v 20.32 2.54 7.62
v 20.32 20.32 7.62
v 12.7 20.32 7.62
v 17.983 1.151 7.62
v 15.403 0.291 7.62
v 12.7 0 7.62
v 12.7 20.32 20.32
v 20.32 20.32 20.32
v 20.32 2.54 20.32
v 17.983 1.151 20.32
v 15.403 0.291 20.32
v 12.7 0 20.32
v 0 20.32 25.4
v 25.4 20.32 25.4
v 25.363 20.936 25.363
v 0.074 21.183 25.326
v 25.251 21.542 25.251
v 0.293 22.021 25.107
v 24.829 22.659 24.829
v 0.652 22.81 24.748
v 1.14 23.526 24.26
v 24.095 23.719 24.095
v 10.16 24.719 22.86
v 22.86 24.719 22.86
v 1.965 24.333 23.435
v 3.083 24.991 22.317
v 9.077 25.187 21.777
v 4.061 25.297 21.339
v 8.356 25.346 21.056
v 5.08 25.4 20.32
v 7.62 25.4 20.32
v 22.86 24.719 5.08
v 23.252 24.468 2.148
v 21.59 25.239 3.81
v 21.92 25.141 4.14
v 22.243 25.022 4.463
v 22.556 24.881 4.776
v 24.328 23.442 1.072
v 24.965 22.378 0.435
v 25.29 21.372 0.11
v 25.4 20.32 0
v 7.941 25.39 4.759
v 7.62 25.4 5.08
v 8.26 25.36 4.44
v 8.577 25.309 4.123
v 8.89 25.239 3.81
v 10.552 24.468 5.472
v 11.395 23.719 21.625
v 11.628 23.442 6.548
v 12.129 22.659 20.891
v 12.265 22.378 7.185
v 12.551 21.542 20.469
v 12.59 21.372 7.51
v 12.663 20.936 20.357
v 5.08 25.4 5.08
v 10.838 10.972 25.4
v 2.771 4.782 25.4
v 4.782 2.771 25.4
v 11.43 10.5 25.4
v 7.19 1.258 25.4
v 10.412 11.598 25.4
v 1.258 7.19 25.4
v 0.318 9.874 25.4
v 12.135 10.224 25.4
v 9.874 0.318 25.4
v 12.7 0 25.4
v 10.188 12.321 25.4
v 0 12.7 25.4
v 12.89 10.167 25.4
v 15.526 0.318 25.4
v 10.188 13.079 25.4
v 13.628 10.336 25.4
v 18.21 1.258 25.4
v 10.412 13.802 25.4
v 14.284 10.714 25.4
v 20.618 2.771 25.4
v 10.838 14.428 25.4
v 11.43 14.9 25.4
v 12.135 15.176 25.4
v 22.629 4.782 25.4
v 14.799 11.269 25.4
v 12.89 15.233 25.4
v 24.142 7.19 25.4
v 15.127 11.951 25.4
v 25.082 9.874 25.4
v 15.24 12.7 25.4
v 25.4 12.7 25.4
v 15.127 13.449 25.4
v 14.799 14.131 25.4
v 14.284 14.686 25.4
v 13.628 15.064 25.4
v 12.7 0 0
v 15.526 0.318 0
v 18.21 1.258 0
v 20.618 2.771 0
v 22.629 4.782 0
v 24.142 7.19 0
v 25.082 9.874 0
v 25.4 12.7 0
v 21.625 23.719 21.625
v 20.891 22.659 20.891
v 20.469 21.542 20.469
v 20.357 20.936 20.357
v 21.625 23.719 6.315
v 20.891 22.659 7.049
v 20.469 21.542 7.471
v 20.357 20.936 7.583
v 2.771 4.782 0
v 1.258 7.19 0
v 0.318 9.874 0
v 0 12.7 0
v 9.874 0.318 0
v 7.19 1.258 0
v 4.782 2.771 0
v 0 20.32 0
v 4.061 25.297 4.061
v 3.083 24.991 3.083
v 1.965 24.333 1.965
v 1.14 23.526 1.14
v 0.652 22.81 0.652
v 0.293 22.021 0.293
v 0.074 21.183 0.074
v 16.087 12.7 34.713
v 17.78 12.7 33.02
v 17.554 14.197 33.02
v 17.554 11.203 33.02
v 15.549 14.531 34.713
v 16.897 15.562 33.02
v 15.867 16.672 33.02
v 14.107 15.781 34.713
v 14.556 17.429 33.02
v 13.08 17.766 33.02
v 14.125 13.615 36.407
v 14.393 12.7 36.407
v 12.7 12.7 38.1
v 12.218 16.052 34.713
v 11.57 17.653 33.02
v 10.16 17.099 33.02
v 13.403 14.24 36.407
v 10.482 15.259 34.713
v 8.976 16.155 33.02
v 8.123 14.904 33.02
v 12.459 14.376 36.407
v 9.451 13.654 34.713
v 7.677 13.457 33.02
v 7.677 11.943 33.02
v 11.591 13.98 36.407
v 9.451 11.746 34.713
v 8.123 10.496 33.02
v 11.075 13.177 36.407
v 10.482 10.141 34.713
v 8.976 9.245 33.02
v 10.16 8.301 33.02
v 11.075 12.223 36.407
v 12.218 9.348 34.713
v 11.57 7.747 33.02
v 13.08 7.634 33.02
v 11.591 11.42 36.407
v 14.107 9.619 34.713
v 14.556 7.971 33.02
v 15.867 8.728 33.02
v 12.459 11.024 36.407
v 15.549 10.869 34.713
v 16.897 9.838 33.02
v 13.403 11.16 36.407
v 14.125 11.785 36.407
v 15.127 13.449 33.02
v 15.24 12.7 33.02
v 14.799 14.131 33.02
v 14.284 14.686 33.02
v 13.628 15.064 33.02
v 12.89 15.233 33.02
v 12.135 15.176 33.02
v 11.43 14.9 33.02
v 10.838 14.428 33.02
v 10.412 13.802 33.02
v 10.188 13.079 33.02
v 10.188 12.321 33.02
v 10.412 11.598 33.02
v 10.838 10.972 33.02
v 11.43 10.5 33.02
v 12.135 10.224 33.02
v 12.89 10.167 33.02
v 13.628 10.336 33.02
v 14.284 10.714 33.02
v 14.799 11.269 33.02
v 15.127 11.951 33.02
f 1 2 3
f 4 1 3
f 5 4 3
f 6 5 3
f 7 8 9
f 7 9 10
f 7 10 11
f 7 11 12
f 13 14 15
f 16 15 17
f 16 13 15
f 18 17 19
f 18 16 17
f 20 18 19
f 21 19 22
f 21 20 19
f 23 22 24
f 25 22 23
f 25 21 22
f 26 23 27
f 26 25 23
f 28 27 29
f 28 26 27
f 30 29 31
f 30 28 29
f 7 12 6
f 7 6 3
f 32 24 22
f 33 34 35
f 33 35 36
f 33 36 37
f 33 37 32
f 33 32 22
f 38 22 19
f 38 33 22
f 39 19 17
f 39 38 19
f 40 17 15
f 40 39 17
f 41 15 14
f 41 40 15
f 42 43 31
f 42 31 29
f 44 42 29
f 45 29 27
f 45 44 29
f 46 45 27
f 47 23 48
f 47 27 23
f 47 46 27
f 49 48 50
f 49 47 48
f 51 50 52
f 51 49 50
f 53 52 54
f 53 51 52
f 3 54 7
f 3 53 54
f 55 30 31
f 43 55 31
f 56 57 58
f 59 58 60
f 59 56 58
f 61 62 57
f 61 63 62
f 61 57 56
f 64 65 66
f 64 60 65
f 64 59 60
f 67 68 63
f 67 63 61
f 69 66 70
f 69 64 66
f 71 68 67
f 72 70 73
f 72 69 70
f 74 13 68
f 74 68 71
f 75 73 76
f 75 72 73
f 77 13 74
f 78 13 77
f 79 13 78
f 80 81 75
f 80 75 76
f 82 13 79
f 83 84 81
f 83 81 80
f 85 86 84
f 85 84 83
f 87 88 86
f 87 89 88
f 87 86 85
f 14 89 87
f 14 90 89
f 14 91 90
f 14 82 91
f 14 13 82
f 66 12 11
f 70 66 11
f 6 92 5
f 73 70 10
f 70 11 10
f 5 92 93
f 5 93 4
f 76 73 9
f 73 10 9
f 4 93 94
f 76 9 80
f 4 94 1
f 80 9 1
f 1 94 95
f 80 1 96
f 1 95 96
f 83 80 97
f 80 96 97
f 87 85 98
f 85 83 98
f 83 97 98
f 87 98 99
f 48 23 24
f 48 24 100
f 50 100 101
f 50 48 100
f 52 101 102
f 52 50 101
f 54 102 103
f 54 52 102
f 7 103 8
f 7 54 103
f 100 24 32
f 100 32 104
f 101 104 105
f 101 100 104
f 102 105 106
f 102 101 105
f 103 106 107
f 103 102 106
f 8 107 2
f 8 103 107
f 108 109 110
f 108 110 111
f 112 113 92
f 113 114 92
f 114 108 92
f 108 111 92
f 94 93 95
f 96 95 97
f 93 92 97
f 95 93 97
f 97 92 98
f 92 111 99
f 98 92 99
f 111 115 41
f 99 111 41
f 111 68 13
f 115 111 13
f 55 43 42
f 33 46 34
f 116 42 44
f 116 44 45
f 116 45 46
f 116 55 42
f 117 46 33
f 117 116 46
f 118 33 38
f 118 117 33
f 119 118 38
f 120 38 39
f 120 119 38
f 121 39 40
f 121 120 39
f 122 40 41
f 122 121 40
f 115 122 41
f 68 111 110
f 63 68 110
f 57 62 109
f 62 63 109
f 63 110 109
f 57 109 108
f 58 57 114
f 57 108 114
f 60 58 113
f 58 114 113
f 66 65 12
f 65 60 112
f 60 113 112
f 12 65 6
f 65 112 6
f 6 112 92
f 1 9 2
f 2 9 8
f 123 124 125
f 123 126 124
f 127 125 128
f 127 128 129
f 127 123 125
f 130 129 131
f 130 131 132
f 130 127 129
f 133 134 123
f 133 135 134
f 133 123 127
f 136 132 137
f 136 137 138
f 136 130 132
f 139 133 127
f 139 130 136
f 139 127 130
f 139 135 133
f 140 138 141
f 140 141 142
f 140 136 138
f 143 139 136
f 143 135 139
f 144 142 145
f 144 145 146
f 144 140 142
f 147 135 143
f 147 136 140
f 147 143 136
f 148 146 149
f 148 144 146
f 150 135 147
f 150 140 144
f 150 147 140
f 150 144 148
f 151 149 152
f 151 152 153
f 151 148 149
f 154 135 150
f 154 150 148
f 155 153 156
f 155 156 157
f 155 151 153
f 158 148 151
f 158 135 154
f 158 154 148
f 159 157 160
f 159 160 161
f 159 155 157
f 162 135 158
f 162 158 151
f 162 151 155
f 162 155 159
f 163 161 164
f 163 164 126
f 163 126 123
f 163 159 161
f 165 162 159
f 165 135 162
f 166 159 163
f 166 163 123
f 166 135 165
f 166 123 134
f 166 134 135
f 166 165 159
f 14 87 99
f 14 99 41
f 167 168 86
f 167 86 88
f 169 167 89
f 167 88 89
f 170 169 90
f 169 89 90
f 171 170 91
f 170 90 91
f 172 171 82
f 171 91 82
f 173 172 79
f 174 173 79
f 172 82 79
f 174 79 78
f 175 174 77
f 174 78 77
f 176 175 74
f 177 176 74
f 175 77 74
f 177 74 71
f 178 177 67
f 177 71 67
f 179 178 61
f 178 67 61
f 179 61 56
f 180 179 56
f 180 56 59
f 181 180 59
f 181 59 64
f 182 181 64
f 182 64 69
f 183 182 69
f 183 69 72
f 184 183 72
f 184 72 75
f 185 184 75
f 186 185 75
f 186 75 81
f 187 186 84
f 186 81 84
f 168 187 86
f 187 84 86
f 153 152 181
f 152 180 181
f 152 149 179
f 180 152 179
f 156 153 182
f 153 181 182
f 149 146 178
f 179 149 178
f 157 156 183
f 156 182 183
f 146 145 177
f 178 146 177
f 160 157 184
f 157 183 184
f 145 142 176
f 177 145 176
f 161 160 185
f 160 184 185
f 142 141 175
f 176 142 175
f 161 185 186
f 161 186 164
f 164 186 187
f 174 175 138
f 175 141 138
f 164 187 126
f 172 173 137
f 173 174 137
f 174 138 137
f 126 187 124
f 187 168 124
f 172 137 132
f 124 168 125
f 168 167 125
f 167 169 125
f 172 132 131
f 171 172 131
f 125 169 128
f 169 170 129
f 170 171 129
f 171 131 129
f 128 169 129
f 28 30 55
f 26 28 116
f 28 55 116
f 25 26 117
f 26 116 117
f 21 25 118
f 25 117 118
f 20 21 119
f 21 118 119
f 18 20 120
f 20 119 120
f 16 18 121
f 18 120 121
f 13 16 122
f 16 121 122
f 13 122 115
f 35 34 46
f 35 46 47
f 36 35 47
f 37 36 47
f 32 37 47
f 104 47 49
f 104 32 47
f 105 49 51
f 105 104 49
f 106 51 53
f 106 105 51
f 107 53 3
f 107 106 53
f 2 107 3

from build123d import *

# Parameters (mm, degrees)
F0_W          = 25.4
F0_H          = 25.4
F1_DEPTH      = 25.4
F2_T1_DEPTH   = 88.9
F3_R          = 2.54
F4_DEPTH      = 7.62
F5_R          = 5.08
F6_DEPTH      = 5.08
F7_SIZE       = 5.07999
F8_W          = 7.62
F8_H          = 12.7
F9_DEPTH      = 25.4
F10_T1_DEPTH  = 50.8
F10_T3_DEPTH  = 50.8
F10_T5_DEPTH  = 7.62
F10_T7_DEPTH  = 12.7
F10_T13_DEPTH = 20.32
F10_T18_DEPTH = 25.4
F10_T26_DEPTH = 20.32
F10_T30_DEPTH = 25.4
F10_T38_DEPTH = 25.4
F10_T43_DEPTH = 20.32
F10_T51_DEPTH = 20.32
F10_T55_DEPTH = 25.4


# Not quite as in the source:
# - a fillet or chamfer that OpenCascade refuses, or shapes differently, is made with other operations: its cross-section is extruded or revolved along the edge and cut away or added
# - a fillet or chamfer is up to 0.001 mm smaller than in the source, because OpenCascade refuses the exact size


with BuildPart() as f1:
    # F0 (on Top) → F1 (new body)
    with BuildSketch(Plane.XY):
        with Locations((12.7, 12.7)):
            Rectangle(F0_W, F0_H)
    extrude(amount=F1_DEPTH)

    # F2: fillet of radius 12.7 on 2 edges, made by hand

    # F2_s2 → F2_t1 (cut)
    with BuildSketch(Plane.XY.offset(-31.75)):
        with BuildLine():
            ThreePointArc((0, 12.7), (3.7197438789, 3.7197438789), (12.7, 0))
            Line((12.7, 0), (0, 0))
            Line((0, 0), (0, 12.7))
        make_face()
        with BuildLine():
            ThreePointArc((12.7, 0), (21.6802561211, 3.7197438789), (25.4, 12.7))
            Line((25.4, 12.7), (25.4, 0))
            Line((25.4, 0), (12.7, 0))
        make_face()
    extrude(amount=F2_T1_DEPTH, mode=Mode.SUBTRACT)

    # F3 (on face) → F4 (join)
    with BuildSketch(Plane.XY.offset(25.4)):
        with Locations((12.7, 12.7)):
            Circle(F3_R)
    extrude(amount=F4_DEPTH)

    # F5 (on face) → F6 (join)
    with BuildSketch(Plane.XY.offset(33.02)):
        with Locations((12.7, 12.7)):
            Circle(F5_R)
    extrude(amount=F6_DEPTH)

    # F7 (size 5.08 in the source; OpenCascade refuses exactly that, so slightly less here)
    f7_edges = [f1.edges().sort_by_distance(p)[0] for p in [
        (7.62, 12.7, 38.1),
    ]]
    chamfer(f7_edges, length=F7_SIZE)

    # F8 (on face) → F9 (cut)
    with BuildSketch(Plane(origin=(0, 25.4, 0), x_dir=(-1, 0, 0), z_dir=(0, 1, 0))):
        with Locations((-16.51, 13.97)):
            Rectangle(F8_W, F8_H)
    extrude(amount=-F9_DEPTH, mode=Mode.SUBTRACT)

    # F10: fillet of radius 5.08 on 8 edges, made by hand

    # F10_s2 → F10_t1 (cut)
    with BuildSketch(Plane.XY.offset(-12.7)):
        with BuildLine():
            ThreePointArc((20.32, 25.4), (23.9121024484, 23.9121024484), (25.4, 20.32))
            Line((25.4, 20.32), (25.4, 25.4))
            Line((25.4, 25.4), (20.32, 25.4))
        make_face()
        with BuildLine():
            ThreePointArc((5.08, 25.4), (1.4878975516, 23.9121024484), (0, 20.32))
            Line((0, 20.32), (0, 25.4))
            Line((0, 25.4), (5.08, 25.4))
        make_face()
    extrude(amount=F10_T1_DEPTH, mode=Mode.SUBTRACT)

    # F10_s4 → F10_t3 (cut)
    with BuildSketch(Plane.YZ.offset(-12.7)):
        with BuildLine():
            ThreePointArc((25.4, 5.08), (23.9121024484, 1.4878975516), (20.32, 0))
            Line((20.32, 0), (25.4, 0))
            Line((25.4, 0), (25.4, 5.08))
        make_face()
        with BuildLine():
            ThreePointArc((20.32, 25.4), (23.9121024484, 23.9121024484), (25.4, 20.32))
            Line((25.4, 20.32), (25.4, 25.4))
            Line((25.4, 25.4), (20.32, 25.4))
        make_face()
    extrude(amount=F10_T3_DEPTH, mode=Mode.SUBTRACT)

    # F10_s6 → F10_t5 (cut)
    with BuildSketch(Plane.YZ.offset(12.7)):
        with BuildLine():
            ThreePointArc((25.4, 2.54), (23.9121024484, 6.1321024484), (20.32, 7.62))
            Line((20.32, 7.62), (25.4, 7.62))
            Line((25.4, 7.62), (25.4, 2.54))
        make_face()
        with BuildLine():
            ThreePointArc((25.4, 25.4), (23.9121024484, 21.8078975516), (20.32, 20.32))
            Line((20.32, 20.32), (25.4, 20.32))
            Line((25.4, 20.32), (25.4, 25.4))
        make_face()
    extrude(amount=F10_T5_DEPTH, mode=Mode.SUBTRACT)

    # F10_s8 → F10_t7 (cut)
    with BuildSketch(Plane.XY.offset(7.62)):
        with BuildLine():
            ThreePointArc((25.4, 25.4), (21.8078975516, 23.9121024484), (20.32, 20.32))
            Line((20.32, 20.32), (20.32, 25.4))
            Line((20.32, 25.4), (25.4, 25.4))
        make_face()
        with BuildLine():
            ThreePointArc((7.62, 25.4), (11.2121024484, 23.9121024484), (12.7, 20.32))
            Line((12.7, 20.32), (12.7, 25.4))
            Line((12.7, 25.4), (7.62, 25.4))
        make_face()
    extrude(amount=F10_T7_DEPTH, mode=Mode.SUBTRACT)


with BuildPart() as f10_tool11:
    # F10_s12 → F10_t13 (new body)
    with BuildSketch(Plane.YZ.offset(33.02)):
        with BuildLine():
            ThreePointArc((25.4, 2.54), (23.9121024484, 6.1321024484), (20.32, 7.62))
            Line((20.32, 7.62), (25.4, 7.62))
            Line((25.4, 7.62), (25.4, 2.54))
        make_face()
    extrude(amount=-F10_T13_DEPTH)

    split(bisect_by=Plane.YZ.offset(25.4), keep=Keep.BOTTOM)

    split(bisect_by=Plane.YZ.offset(20.32), keep=Keep.TOP)


with BuildPart() as f10_tool16:
    # F10_s17 → F10_t18 (new body)
    with BuildSketch(Plane.XY.offset(20.32)):
        with BuildLine():
            ThreePointArc((25.4, 25.4), (21.8078975516, 23.9121024484), (20.32, 20.32))
            Line((20.32, 20.32), (20.32, 25.4))
            Line((20.32, 25.4), (25.4, 25.4))
        make_face()
    extrude(amount=-F10_T18_DEPTH)

    split(bisect_by=Plane.XY, keep=Keep.TOP)

    split(bisect_by=Plane.XY.offset(7.62), keep=Keep.BOTTOM)


with BuildPart() as f10_tool11_1:
    add(f10_tool11.part)

    # F10_t21: intersect F10_tool16
    add(f10_tool16.part, mode=Mode.INTERSECT)


with BuildPart() as f1_1:
    add(f1.part)

    # F10_t9: cut F10_tool11
    add(f10_tool11_1.part, mode=Mode.SUBTRACT)


with BuildPart() as f10_tool24:
    # F10_s25 → F10_t26 (new body)
    with BuildSketch(Plane.YZ.offset(20.32)):
        with BuildLine():
            ThreePointArc((25.4, 2.54), (23.9121024484, 6.1321024484), (20.32, 7.62))
            Line((20.32, 7.62), (25.4, 7.62))
            Line((25.4, 7.62), (25.4, 2.54))
        make_face()
    extrude(amount=-F10_T26_DEPTH)

    split(bisect_by=Plane.YZ.offset(12.7), keep=Keep.BOTTOM)


with BuildPart() as f10_tool28:
    # F10_s29 → F10_t30 (new body)
    with BuildSketch(Plane.XY.offset(-5.08)):
        with BuildLine():
            ThreePointArc((7.62, 25.4), (11.2121024484, 23.9121024484), (12.7, 20.32))
            Line((12.7, 20.32), (12.7, 25.4))
            Line((12.7, 25.4), (7.62, 25.4))
        make_face()
    extrude(amount=F10_T30_DEPTH)

    split(bisect_by=Plane.XY, keep=Keep.TOP)

    split(bisect_by=Plane.XY.offset(7.62), keep=Keep.BOTTOM)


with BuildPart() as f10_tool24_1:
    add(f10_tool24.part)

    # F10_t33: intersect F10_tool28
    add(f10_tool28.part, mode=Mode.INTERSECT)


with BuildPart() as f1_2:
    add(f1_1.part)

    # F10_t22: cut F10_tool24
    add(f10_tool24_1.part, mode=Mode.SUBTRACT)


with BuildPart() as f10_tool36:
    # F10_s37 → F10_t38 (new body)
    with BuildSketch(Plane.XY.offset(33.02)):
        with BuildLine():
            ThreePointArc((25.4, 25.4), (21.8078975516, 23.9121024484), (20.32, 20.32))
            Line((20.32, 20.32), (20.32, 25.4))
            Line((20.32, 25.4), (25.4, 25.4))
        make_face()
    extrude(amount=-F10_T38_DEPTH)

    split(bisect_by=Plane.XY.offset(25.4), keep=Keep.BOTTOM)

    split(bisect_by=Plane.XY.offset(20.32), keep=Keep.TOP)


with BuildPart() as f10_tool41:
    # F10_s42 → F10_t43 (new body)
    with BuildSketch(Plane.YZ.offset(12.7)):
        with BuildLine():
            ThreePointArc((25.4, 25.4), (23.9121024484, 21.8078975516), (20.32, 20.32))
            Line((20.32, 20.32), (25.4, 20.32))
            Line((25.4, 20.32), (25.4, 25.4))
        make_face()
    extrude(amount=F10_T43_DEPTH)

    split(bisect_by=Plane.YZ.offset(25.4), keep=Keep.BOTTOM)

    split(bisect_by=Plane.YZ.offset(20.32), keep=Keep.TOP)


with BuildPart() as f10_tool36_1:
    add(f10_tool36.part)

    # F10_t46: intersect F10_tool41
    add(f10_tool41.part, mode=Mode.INTERSECT)


with BuildPart() as f1_3:
    add(f1_2.part)

    # F10_t34: cut F10_tool36
    add(f10_tool36_1.part, mode=Mode.SUBTRACT)


with BuildPart() as f10_tool49:
    # F10_s50 → F10_t51 (new body)
    with BuildSketch(Plane.YZ):
        with BuildLine():
            ThreePointArc((25.4, 25.4), (23.9121024484, 21.8078975516), (20.32, 20.32))
            Line((20.32, 20.32), (25.4, 20.32))
            Line((25.4, 20.32), (25.4, 25.4))
        make_face()
    extrude(amount=F10_T51_DEPTH)

    split(bisect_by=Plane.YZ.offset(12.7), keep=Keep.BOTTOM)


with BuildPart() as f10_tool53:
    # F10_s54 → F10_t55 (new body)
    with BuildSketch(Plane.XY.offset(7.62)):
        with BuildLine():
            ThreePointArc((7.62, 25.4), (11.2121024484, 23.9121024484), (12.7, 20.32))
            Line((12.7, 20.32), (12.7, 25.4))
            Line((12.7, 25.4), (7.62, 25.4))
        make_face()
    extrude(amount=F10_T55_DEPTH)

    split(bisect_by=Plane.XY.offset(25.4), keep=Keep.BOTTOM)

    split(bisect_by=Plane.XY.offset(20.32), keep=Keep.TOP)


with BuildPart() as f10_tool49_1:
    add(f10_tool49.part)

    # F10_t58: intersect F10_tool53
    add(f10_tool53.part, mode=Mode.INTERSECT)


with BuildPart() as f1_4:
    add(f1_3.part)

    # F10_t47: cut F10_tool49
    add(f10_tool49_1.part, mode=Mode.SUBTRACT)


solid = f1_4.part
